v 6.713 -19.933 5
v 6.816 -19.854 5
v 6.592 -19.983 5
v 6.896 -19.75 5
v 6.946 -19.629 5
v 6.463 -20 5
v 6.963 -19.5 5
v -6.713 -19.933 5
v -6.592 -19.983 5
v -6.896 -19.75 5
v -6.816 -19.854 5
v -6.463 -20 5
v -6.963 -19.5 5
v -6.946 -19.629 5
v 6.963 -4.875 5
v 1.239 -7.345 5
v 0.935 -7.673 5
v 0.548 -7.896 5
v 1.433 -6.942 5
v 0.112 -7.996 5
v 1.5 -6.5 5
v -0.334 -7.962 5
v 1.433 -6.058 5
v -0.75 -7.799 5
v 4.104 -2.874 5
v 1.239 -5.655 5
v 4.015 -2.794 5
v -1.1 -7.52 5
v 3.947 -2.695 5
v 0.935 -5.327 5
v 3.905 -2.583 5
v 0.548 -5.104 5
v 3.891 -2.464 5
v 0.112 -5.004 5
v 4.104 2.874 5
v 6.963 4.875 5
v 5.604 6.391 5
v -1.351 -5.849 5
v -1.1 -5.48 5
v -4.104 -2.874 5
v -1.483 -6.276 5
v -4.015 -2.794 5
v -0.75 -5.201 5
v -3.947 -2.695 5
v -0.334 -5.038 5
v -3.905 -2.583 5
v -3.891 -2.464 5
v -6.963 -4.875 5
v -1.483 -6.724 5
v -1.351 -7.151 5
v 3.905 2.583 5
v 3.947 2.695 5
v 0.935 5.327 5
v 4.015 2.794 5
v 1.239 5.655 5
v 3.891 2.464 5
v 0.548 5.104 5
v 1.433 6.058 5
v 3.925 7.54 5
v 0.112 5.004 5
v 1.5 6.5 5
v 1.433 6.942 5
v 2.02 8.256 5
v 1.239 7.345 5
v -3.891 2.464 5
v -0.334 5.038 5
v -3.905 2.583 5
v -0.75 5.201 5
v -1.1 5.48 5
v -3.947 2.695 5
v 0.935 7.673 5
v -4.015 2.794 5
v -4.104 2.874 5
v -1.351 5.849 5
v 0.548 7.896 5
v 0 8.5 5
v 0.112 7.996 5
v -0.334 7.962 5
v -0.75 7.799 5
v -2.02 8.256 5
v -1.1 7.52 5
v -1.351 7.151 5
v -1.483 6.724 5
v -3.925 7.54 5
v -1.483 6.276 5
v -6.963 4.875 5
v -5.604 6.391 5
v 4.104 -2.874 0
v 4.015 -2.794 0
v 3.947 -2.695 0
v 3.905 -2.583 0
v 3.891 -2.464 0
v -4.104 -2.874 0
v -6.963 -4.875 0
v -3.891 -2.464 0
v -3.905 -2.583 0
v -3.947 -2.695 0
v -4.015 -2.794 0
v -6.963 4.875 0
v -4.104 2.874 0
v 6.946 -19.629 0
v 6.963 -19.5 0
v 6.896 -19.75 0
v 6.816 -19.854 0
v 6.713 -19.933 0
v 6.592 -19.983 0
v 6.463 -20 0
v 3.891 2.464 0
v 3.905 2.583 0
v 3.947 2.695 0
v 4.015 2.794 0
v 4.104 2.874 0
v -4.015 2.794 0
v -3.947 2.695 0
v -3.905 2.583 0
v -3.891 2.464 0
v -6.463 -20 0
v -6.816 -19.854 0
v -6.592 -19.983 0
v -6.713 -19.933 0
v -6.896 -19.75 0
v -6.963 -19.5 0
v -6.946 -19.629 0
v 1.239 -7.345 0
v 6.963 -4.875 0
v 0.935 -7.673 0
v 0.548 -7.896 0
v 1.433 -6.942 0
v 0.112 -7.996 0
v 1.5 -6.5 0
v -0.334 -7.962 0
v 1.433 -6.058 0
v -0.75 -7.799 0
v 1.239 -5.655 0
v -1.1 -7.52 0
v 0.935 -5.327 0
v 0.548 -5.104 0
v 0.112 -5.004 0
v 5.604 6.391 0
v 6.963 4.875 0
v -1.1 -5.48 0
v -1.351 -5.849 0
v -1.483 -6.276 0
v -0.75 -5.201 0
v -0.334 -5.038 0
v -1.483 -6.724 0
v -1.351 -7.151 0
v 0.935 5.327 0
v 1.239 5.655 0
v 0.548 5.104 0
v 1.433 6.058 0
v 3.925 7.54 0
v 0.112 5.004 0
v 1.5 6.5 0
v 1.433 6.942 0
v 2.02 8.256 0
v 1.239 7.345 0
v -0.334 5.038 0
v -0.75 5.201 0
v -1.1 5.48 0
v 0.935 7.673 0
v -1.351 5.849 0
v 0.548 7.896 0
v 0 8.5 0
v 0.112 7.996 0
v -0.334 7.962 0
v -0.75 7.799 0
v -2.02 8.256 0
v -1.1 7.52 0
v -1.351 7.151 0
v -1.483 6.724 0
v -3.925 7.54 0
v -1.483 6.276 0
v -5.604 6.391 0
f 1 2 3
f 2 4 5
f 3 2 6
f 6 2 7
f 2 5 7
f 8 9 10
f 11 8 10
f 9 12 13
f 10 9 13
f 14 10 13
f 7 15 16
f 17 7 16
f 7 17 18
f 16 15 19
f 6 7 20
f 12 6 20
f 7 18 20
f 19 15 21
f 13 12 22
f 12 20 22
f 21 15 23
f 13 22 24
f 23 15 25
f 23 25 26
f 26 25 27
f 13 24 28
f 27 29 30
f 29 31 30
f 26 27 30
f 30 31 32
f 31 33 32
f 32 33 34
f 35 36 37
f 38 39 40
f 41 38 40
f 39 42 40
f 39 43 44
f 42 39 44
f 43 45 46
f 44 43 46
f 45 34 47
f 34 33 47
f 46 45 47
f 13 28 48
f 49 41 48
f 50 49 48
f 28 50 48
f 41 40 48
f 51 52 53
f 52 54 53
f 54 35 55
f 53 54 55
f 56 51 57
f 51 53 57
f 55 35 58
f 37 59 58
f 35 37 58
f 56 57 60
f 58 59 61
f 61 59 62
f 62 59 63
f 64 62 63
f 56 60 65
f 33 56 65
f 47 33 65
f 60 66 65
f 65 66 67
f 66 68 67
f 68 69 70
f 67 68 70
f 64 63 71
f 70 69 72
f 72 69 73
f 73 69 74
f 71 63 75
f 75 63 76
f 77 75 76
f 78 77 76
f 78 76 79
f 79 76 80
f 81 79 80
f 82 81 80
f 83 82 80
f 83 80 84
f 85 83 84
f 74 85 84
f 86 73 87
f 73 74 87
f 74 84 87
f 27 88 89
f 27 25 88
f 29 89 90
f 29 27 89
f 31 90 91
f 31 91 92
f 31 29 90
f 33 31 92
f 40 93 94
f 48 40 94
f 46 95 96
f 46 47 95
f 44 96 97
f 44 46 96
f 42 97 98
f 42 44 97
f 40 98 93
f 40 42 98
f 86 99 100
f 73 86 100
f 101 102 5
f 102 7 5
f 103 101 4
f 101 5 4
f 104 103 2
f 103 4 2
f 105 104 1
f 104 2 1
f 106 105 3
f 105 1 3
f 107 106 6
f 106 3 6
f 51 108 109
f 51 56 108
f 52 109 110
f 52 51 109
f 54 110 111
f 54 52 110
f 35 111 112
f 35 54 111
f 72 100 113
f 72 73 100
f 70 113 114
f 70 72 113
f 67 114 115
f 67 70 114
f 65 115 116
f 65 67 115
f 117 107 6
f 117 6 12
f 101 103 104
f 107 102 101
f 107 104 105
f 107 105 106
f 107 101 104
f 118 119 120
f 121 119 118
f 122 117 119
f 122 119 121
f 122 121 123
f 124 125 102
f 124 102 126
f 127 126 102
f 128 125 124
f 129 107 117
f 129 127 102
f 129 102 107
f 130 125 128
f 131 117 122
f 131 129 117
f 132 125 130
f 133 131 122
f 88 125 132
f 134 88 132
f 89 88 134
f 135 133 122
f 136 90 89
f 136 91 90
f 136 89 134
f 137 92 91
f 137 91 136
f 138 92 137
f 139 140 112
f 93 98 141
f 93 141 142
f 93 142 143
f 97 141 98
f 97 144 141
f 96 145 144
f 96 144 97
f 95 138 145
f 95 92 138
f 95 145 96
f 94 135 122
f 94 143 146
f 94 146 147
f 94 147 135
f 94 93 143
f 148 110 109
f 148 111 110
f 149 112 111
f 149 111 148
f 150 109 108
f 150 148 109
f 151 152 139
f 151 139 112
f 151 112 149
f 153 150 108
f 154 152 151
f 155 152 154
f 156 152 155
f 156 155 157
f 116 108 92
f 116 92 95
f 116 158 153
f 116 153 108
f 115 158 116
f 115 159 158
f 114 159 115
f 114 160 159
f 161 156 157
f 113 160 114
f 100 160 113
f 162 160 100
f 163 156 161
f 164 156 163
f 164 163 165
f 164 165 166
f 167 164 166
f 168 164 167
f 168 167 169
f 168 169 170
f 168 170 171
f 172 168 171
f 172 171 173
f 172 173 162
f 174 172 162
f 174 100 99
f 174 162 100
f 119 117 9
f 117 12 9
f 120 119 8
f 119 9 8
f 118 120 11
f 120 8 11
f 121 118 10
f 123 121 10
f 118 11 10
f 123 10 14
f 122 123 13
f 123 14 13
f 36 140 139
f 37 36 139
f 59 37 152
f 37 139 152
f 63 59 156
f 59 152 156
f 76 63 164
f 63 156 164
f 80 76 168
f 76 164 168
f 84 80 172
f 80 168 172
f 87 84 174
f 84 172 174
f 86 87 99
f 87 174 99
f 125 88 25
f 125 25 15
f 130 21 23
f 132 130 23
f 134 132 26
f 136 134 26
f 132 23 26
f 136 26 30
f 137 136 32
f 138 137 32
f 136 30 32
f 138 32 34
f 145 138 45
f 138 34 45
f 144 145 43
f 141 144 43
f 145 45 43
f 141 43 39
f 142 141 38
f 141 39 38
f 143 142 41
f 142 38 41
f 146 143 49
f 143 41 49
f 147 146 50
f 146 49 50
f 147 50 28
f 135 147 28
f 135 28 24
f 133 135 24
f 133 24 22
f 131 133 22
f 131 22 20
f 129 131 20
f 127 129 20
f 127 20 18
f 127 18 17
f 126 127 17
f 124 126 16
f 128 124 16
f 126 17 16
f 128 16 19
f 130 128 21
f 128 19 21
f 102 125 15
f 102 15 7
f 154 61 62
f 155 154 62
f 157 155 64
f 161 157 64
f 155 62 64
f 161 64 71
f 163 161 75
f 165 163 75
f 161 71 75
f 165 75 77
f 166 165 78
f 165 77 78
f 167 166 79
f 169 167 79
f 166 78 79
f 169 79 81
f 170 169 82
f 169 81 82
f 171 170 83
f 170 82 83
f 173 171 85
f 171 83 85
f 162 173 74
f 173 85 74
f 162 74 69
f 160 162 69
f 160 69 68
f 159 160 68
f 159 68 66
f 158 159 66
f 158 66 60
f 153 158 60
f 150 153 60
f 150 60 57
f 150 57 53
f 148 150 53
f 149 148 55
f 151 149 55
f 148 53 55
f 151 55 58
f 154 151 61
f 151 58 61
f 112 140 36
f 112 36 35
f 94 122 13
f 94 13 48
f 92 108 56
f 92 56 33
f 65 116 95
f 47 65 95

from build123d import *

# Parameters (mm, degrees)
SKETCH_1_R          = 8.5
EXTRUDE_1_DEPTH     = 5
SKETCH_2_R          = 1.5
CUT_EXTRUDE_1_DEPTH = 5
CUT_EXTRUDE_2_DEPTH = 6
EXTRUDE_2_DEPTH     = 5
FILLET_2_R          = 0.5
CUT_EXTRUDE_3_DEPTH = 10
FILLET_3_R          = 0.5


with BuildPart() as part:
    # 草图1 → 凸台-拉伸1 (new body)
    with BuildSketch(Plane.XY):
        Circle(SKETCH_1_R)
    extrude(amount=EXTRUDE_1_DEPTH)

    # 草图2 → 切除-拉伸1 (cut)
    with BuildSketch(Plane.XY.offset(5)):
        with Locations((0, 6.5)):
            Circle(SKETCH_2_R)
        with Locations((0, -6.5)):
            Circle(SKETCH_2_R)
    extrude(amount=-CUT_EXTRUDE_1_DEPTH, mode=Mode.SUBTRACT)

    # 草图3 → 切除-拉伸2 (cut, through all)
    with BuildSketch(Plane(origin=(0, 0, 0), x_dir=(-1, 0, 0), z_dir=(0, 0, -1))):
        with BuildLine():
            Line((6.962792376, 4.875399709), (3.89097221, 2.724488073))
            ThreePointArc((3.89097221, 2.724488073), (4.530155516, 1.428352548), (4.75, 0))
            ThreePointArc((4.75, 0), (4.530155516, -1.428352548), (3.89097221, -2.724488073))
            Line((3.89097221, -2.724488073), (6.962792376, -4.875399709))
            ThreePointArc((6.962792376, -4.875399709), (8.106594081, -2.555999296), (8.5, 0))
            ThreePointArc((8.5, 0), (8.106594081, 2.555999296), (6.962792376, 4.875399709))
        make_face()
    cut_extrude_2 = extrude(amount=-CUT_EXTRUDE_2_DEPTH, mode=Mode.SUBTRACT)

    # 镜向1: 切除-拉伸2 across plane
    add(cut_extrude_2.mirror(Plane(origin=(0, 0, 0), x_dir=(0, 0, 1), z_dir=(1, 0, 0))), mode=Mode.SUBTRACT)


with BuildPart() as body_2:
    # 草图4 → 凸台-拉伸2 (new body)
    with BuildSketch(Plane(origin=(0, 0, 0), x_dir=(-1, 0, 0), z_dir=(0, 0, -1))):
        with BuildLine():
            ThreePointArc((6.962792376, -4.875399709), (0, -8.5), (-6.962792376, -4.875399709))
            Line((-6.962792376, -4.875399709), (-6.962792376, -20))
            Line((-6.962792376, -20), (6.962792376, -20))
            Line((6.962792376, -20), (6.962792376, -4.875399709))
        make_face()
    extrude(amount=-EXTRUDE_2_DEPTH)


with BuildPart() as part_1:
    add(part.part)

    # Combine 1: union body 2
    add(body_2.part)

    # 圆角2
    fillet_2_edges = [part_1.edges().sort_by_distance(p)[0] for p in [
        (-6.962792376, -20, 2.5),
        (6.962792376, -20, 2.5),
    ]]
    fillet(fillet_2_edges, radius=FILLET_2_R)

    # 草图6 → 切除-拉伸3 (cut)
    with BuildSketch(Plane(origin=(0, 0, 0), x_dir=(-1, 0, 0), z_dir=(0, 0, -1))):
        with BuildLine():
            Line((3.89097221, 2.724488073), (3.89097221, -2.724488073))
            ThreePointArc((3.89097221, -2.724488073), (4.75, 0), (3.89097221, 2.724488073))
        make_face()
        with BuildLine():
            Line((-3.89097221, 2.724488073), (-3.89097221, -2.724488073))
            ThreePointArc((-3.89097221, -2.724488073), (-4.75, 0), (-3.89097221, 2.724488073))
        make_face()
    extrude(amount=-CUT_EXTRUDE_3_DEPTH, mode=Mode.SUBTRACT)

    # 圆角3
    fillet_3_edges = [part_1.edges().sort_by_distance(p)[0] for p in [
        (-3.89097221, -2.724488073, 2.5),
        (-3.89097221, 2.724488073, 2.5),
        (3.89097221, 2.724488073, 2.5),
        (3.89097221, -2.724488073, 2.5),
    ]]
    fillet(fillet_3_edges, radius=FILLET_3_R)


solid = part_1.part
